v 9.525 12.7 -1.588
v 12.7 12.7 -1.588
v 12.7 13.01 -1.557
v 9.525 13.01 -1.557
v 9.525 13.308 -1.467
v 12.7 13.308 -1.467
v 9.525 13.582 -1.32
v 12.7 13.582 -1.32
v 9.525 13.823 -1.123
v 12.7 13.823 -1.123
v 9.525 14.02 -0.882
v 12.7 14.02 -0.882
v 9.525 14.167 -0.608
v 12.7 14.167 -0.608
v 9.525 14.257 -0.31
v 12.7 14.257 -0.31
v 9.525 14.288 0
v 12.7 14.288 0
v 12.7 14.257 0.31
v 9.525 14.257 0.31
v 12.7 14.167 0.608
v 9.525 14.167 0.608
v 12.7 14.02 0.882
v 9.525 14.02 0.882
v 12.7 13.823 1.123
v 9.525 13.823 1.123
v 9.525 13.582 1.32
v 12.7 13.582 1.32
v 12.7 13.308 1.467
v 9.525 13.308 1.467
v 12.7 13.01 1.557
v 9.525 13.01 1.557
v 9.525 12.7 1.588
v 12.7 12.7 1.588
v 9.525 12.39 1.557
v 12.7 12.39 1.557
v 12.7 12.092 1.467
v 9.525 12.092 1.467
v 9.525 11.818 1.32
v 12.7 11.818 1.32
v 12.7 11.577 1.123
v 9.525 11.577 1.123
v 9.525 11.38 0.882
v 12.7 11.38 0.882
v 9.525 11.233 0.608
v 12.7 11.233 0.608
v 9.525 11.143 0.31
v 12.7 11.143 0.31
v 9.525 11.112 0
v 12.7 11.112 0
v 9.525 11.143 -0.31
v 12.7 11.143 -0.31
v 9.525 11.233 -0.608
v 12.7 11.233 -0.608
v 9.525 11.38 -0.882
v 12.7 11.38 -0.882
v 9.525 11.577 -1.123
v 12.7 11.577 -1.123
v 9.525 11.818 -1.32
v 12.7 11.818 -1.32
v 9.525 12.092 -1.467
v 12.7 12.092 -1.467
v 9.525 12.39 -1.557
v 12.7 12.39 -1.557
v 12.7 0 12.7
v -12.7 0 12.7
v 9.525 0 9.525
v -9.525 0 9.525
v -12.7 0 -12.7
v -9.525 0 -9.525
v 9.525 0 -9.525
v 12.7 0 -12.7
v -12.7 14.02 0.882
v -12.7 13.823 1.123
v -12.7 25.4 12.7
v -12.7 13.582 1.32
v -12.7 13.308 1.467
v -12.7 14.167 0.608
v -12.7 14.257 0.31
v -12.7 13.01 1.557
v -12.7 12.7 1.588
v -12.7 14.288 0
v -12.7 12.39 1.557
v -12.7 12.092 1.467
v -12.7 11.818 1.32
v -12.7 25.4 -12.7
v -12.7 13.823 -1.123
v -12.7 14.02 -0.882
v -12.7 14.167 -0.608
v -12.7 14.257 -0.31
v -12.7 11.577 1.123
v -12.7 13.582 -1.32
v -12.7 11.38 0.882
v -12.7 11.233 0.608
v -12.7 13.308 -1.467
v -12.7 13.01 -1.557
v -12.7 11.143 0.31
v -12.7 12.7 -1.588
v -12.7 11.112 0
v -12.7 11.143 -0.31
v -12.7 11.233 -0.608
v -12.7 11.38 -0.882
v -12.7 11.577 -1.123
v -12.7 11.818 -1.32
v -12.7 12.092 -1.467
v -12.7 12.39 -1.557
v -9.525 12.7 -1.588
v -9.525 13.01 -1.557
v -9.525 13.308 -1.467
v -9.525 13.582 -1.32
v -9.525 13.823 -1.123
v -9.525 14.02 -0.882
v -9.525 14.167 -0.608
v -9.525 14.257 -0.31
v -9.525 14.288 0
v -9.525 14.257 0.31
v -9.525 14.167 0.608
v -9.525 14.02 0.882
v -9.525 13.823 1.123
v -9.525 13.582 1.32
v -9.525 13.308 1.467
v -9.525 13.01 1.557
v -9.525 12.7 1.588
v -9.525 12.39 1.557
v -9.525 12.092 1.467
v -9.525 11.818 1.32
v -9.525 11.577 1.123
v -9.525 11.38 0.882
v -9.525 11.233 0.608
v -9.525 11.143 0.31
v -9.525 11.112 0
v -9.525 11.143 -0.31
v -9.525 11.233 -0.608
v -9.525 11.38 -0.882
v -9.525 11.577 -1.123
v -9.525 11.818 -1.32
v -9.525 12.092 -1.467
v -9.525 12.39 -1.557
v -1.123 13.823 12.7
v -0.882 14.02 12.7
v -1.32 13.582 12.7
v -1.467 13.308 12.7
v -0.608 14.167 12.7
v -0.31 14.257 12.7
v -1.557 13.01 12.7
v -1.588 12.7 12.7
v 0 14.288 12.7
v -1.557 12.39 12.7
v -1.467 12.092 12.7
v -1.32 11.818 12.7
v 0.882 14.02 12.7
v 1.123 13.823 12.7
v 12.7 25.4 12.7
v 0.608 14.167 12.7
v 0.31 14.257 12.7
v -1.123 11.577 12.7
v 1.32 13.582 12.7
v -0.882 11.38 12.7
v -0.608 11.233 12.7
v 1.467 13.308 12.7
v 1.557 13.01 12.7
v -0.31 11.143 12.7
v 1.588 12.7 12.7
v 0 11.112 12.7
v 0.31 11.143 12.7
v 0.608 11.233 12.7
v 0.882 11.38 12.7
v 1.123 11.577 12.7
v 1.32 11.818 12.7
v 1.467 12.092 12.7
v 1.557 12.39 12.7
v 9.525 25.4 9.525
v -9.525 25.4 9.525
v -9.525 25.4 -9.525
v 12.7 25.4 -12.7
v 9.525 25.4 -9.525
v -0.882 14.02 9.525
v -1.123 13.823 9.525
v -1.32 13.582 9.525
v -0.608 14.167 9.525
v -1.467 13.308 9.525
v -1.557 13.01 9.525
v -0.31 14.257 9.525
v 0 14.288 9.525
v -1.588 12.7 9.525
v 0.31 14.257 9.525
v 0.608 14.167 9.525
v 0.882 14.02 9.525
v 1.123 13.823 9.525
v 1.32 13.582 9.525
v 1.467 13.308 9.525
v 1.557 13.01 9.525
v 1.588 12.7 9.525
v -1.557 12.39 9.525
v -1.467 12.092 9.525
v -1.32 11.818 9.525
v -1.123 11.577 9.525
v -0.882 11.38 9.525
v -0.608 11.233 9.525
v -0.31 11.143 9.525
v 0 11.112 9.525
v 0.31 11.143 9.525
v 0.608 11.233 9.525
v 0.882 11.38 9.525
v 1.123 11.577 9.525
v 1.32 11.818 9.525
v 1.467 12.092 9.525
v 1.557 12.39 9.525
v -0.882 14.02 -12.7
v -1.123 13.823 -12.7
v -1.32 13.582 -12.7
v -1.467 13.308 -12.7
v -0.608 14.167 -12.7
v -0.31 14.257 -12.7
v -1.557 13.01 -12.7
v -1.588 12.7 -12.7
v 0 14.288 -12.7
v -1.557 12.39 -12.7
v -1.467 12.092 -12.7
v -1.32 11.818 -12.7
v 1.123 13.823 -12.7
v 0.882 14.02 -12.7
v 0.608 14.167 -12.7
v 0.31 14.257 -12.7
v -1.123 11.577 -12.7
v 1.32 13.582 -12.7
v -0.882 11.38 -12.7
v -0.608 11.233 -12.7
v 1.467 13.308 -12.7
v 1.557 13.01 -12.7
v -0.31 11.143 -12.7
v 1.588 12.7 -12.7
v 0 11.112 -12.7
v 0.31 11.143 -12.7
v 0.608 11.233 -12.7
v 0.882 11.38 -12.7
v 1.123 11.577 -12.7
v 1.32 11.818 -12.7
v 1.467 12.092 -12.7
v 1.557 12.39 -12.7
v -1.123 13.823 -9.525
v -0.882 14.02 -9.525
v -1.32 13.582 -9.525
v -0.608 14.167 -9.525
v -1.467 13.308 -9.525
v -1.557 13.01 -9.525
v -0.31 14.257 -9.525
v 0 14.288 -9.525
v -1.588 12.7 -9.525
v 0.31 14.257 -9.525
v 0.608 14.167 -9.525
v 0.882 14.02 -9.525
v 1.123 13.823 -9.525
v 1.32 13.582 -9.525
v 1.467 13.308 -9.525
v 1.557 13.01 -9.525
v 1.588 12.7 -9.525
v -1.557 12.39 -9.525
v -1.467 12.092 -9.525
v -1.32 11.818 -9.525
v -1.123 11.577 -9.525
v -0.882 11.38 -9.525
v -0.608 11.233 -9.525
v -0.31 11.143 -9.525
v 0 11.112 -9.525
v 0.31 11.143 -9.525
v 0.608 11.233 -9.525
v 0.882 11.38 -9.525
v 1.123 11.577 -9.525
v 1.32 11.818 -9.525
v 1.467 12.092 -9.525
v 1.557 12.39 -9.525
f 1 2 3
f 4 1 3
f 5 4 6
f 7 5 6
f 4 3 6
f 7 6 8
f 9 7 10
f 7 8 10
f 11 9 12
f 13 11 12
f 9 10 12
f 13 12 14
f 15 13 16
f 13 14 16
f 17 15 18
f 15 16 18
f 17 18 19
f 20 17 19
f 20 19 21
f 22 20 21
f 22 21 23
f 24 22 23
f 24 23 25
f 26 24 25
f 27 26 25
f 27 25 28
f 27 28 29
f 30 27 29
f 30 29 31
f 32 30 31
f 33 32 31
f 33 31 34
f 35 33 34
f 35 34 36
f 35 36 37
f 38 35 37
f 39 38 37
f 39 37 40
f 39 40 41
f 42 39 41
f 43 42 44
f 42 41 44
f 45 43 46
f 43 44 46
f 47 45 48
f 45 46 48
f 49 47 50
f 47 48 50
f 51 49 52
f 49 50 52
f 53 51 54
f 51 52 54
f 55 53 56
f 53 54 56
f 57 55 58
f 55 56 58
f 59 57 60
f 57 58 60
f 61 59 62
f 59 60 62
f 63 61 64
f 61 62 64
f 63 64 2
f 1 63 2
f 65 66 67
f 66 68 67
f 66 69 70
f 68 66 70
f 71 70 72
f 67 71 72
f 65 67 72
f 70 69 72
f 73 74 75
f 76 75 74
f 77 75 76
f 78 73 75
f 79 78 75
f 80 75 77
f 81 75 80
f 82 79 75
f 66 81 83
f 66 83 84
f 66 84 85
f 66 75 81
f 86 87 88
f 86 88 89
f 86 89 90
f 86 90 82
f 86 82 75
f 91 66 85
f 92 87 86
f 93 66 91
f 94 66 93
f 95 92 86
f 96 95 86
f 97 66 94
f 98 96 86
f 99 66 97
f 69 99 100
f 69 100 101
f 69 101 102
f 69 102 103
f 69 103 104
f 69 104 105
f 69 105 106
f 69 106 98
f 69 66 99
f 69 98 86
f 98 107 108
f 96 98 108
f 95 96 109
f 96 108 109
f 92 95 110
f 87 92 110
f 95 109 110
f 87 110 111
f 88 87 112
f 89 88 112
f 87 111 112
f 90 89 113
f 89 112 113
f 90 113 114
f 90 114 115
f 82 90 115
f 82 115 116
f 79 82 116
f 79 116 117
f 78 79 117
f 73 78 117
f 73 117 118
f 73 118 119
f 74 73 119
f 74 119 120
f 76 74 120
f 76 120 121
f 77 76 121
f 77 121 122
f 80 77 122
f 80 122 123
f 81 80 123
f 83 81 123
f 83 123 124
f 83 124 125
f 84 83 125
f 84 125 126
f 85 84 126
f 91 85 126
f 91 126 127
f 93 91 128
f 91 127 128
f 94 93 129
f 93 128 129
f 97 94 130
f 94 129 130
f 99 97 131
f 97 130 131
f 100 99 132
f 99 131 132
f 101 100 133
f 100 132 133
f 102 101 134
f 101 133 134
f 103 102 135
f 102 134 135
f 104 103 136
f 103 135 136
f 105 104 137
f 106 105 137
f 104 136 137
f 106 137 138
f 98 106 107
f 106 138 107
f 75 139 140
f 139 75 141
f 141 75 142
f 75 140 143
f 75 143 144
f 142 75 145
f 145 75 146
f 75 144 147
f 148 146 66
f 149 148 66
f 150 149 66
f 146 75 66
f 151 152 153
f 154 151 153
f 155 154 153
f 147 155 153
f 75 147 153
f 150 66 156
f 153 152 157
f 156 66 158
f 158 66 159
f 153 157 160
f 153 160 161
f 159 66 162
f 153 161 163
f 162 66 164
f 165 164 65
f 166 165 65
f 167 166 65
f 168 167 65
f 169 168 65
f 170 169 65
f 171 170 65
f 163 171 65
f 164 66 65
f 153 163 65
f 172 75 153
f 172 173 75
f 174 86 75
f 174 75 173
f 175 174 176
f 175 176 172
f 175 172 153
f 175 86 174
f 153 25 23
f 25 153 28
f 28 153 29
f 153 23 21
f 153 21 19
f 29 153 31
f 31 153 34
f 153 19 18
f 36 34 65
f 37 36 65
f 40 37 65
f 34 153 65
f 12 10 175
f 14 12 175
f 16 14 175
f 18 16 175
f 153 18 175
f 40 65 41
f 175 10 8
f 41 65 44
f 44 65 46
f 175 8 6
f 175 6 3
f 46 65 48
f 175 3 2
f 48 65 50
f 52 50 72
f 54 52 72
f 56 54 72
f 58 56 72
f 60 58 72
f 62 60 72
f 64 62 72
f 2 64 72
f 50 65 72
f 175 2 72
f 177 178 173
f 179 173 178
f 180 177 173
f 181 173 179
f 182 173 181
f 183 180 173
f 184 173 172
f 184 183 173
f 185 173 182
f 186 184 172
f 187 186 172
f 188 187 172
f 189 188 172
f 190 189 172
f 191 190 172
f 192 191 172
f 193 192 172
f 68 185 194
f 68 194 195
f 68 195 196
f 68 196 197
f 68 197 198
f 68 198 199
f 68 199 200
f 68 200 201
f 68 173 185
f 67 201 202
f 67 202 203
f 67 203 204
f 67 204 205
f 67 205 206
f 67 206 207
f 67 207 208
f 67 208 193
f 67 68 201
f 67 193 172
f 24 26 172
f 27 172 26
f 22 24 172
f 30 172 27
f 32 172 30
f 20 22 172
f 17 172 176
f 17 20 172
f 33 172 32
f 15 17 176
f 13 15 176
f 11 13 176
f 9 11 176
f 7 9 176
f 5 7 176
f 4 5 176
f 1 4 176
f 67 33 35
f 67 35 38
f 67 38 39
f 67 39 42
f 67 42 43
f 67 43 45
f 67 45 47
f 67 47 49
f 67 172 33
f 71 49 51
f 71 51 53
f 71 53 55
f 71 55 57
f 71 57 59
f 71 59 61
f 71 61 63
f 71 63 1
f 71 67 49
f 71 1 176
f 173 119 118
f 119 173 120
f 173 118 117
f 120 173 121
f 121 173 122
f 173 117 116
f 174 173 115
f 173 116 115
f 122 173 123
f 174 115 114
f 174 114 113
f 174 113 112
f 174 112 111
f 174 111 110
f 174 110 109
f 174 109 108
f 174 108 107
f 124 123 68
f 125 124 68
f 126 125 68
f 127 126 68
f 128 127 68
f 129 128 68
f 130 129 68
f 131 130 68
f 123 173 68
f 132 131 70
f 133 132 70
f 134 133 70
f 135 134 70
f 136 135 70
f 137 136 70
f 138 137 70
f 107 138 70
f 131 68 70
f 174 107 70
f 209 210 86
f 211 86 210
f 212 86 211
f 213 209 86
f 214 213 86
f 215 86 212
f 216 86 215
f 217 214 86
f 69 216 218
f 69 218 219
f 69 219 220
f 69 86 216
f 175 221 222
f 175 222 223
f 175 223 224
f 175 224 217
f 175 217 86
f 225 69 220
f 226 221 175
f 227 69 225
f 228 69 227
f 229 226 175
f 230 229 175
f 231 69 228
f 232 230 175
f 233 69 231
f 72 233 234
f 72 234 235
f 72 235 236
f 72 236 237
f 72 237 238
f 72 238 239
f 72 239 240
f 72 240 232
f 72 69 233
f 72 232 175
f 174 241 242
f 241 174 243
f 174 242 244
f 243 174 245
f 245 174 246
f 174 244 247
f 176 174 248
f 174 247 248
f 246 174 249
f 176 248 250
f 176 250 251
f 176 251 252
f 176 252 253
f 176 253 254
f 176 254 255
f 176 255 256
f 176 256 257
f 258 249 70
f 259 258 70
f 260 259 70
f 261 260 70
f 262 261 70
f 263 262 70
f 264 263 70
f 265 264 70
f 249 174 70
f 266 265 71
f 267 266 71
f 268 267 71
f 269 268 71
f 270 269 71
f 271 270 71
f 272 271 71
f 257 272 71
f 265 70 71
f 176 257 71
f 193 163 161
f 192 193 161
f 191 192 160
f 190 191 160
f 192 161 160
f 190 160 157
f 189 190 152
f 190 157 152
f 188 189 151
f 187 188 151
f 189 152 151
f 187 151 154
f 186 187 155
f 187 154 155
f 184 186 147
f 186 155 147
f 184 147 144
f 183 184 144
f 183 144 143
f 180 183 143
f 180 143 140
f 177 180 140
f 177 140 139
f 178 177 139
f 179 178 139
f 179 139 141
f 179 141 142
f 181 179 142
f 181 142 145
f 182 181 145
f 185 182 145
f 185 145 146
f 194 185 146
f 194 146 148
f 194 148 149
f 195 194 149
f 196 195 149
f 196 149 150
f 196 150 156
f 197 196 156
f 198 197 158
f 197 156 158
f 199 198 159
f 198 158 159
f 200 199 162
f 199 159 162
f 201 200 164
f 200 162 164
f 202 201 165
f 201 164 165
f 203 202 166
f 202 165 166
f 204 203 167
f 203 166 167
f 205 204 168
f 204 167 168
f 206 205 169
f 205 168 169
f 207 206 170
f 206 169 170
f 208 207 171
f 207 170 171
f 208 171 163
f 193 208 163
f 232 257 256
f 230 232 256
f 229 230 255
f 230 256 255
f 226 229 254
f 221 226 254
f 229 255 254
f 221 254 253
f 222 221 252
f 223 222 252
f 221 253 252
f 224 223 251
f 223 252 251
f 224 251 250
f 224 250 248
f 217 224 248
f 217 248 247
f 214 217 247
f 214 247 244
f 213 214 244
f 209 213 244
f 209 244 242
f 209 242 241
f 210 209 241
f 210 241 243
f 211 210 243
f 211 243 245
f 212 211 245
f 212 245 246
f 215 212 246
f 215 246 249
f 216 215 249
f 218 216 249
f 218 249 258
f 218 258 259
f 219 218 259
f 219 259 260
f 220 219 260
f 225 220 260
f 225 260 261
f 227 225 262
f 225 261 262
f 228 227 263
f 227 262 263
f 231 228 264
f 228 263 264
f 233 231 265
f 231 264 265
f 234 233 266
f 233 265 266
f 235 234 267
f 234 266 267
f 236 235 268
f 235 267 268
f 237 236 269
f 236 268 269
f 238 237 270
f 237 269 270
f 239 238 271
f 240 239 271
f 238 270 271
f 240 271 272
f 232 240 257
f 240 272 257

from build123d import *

# Parameters (mm, degrees)
SKETCH_5_W          = 25.4
SKETCH_5_H          = 25.4
SKETCH_5_W_2        = 19.05
SKETCH_5_H_2        = 19.05
EXTRUDE_1_DEPTH     = 25.4
SKETCH_6_R          = 1.5875
CUT_EXTRUDE_1_DEPTH = 30.48
SKETCH_7_R          = 1.5875
CUT_EXTRUDE_2_DEPTH = 30.48


with BuildPart() as part:
    # 스케치5 → 보스-돌출1 (new body)
    with BuildSketch(Plane(origin=(0, 0, 0), x_dir=(1, 0, 0), z_dir=(0, 1, 0))):
        Rectangle(SKETCH_5_W, SKETCH_5_H)
        Rectangle(SKETCH_5_W_2, SKETCH_5_H_2, mode=Mode.SUBTRACT)
    extrude(amount=EXTRUDE_1_DEPTH)

    # 스케치6 → 컷-돌출1 (cut)
    with BuildSketch(Plane.XY.offset(12.7)):
        with Locations((0, 12.7)):
            Circle(SKETCH_6_R)
    extrude(amount=-CUT_EXTRUDE_1_DEPTH, mode=Mode.SUBTRACT)

    # 스케치7 → 컷-돌출2 (cut)
    with BuildSketch(Plane(origin=(12.7, 0, 0), x_dir=(0, 0, -1), z_dir=(1, 0, 0))):
        with Locations((0, 12.7)):
            Circle(SKETCH_7_R)
    extrude(amount=-CUT_EXTRUDE_2_DEPTH, mode=Mode.SUBTRACT)


solid = part.part
